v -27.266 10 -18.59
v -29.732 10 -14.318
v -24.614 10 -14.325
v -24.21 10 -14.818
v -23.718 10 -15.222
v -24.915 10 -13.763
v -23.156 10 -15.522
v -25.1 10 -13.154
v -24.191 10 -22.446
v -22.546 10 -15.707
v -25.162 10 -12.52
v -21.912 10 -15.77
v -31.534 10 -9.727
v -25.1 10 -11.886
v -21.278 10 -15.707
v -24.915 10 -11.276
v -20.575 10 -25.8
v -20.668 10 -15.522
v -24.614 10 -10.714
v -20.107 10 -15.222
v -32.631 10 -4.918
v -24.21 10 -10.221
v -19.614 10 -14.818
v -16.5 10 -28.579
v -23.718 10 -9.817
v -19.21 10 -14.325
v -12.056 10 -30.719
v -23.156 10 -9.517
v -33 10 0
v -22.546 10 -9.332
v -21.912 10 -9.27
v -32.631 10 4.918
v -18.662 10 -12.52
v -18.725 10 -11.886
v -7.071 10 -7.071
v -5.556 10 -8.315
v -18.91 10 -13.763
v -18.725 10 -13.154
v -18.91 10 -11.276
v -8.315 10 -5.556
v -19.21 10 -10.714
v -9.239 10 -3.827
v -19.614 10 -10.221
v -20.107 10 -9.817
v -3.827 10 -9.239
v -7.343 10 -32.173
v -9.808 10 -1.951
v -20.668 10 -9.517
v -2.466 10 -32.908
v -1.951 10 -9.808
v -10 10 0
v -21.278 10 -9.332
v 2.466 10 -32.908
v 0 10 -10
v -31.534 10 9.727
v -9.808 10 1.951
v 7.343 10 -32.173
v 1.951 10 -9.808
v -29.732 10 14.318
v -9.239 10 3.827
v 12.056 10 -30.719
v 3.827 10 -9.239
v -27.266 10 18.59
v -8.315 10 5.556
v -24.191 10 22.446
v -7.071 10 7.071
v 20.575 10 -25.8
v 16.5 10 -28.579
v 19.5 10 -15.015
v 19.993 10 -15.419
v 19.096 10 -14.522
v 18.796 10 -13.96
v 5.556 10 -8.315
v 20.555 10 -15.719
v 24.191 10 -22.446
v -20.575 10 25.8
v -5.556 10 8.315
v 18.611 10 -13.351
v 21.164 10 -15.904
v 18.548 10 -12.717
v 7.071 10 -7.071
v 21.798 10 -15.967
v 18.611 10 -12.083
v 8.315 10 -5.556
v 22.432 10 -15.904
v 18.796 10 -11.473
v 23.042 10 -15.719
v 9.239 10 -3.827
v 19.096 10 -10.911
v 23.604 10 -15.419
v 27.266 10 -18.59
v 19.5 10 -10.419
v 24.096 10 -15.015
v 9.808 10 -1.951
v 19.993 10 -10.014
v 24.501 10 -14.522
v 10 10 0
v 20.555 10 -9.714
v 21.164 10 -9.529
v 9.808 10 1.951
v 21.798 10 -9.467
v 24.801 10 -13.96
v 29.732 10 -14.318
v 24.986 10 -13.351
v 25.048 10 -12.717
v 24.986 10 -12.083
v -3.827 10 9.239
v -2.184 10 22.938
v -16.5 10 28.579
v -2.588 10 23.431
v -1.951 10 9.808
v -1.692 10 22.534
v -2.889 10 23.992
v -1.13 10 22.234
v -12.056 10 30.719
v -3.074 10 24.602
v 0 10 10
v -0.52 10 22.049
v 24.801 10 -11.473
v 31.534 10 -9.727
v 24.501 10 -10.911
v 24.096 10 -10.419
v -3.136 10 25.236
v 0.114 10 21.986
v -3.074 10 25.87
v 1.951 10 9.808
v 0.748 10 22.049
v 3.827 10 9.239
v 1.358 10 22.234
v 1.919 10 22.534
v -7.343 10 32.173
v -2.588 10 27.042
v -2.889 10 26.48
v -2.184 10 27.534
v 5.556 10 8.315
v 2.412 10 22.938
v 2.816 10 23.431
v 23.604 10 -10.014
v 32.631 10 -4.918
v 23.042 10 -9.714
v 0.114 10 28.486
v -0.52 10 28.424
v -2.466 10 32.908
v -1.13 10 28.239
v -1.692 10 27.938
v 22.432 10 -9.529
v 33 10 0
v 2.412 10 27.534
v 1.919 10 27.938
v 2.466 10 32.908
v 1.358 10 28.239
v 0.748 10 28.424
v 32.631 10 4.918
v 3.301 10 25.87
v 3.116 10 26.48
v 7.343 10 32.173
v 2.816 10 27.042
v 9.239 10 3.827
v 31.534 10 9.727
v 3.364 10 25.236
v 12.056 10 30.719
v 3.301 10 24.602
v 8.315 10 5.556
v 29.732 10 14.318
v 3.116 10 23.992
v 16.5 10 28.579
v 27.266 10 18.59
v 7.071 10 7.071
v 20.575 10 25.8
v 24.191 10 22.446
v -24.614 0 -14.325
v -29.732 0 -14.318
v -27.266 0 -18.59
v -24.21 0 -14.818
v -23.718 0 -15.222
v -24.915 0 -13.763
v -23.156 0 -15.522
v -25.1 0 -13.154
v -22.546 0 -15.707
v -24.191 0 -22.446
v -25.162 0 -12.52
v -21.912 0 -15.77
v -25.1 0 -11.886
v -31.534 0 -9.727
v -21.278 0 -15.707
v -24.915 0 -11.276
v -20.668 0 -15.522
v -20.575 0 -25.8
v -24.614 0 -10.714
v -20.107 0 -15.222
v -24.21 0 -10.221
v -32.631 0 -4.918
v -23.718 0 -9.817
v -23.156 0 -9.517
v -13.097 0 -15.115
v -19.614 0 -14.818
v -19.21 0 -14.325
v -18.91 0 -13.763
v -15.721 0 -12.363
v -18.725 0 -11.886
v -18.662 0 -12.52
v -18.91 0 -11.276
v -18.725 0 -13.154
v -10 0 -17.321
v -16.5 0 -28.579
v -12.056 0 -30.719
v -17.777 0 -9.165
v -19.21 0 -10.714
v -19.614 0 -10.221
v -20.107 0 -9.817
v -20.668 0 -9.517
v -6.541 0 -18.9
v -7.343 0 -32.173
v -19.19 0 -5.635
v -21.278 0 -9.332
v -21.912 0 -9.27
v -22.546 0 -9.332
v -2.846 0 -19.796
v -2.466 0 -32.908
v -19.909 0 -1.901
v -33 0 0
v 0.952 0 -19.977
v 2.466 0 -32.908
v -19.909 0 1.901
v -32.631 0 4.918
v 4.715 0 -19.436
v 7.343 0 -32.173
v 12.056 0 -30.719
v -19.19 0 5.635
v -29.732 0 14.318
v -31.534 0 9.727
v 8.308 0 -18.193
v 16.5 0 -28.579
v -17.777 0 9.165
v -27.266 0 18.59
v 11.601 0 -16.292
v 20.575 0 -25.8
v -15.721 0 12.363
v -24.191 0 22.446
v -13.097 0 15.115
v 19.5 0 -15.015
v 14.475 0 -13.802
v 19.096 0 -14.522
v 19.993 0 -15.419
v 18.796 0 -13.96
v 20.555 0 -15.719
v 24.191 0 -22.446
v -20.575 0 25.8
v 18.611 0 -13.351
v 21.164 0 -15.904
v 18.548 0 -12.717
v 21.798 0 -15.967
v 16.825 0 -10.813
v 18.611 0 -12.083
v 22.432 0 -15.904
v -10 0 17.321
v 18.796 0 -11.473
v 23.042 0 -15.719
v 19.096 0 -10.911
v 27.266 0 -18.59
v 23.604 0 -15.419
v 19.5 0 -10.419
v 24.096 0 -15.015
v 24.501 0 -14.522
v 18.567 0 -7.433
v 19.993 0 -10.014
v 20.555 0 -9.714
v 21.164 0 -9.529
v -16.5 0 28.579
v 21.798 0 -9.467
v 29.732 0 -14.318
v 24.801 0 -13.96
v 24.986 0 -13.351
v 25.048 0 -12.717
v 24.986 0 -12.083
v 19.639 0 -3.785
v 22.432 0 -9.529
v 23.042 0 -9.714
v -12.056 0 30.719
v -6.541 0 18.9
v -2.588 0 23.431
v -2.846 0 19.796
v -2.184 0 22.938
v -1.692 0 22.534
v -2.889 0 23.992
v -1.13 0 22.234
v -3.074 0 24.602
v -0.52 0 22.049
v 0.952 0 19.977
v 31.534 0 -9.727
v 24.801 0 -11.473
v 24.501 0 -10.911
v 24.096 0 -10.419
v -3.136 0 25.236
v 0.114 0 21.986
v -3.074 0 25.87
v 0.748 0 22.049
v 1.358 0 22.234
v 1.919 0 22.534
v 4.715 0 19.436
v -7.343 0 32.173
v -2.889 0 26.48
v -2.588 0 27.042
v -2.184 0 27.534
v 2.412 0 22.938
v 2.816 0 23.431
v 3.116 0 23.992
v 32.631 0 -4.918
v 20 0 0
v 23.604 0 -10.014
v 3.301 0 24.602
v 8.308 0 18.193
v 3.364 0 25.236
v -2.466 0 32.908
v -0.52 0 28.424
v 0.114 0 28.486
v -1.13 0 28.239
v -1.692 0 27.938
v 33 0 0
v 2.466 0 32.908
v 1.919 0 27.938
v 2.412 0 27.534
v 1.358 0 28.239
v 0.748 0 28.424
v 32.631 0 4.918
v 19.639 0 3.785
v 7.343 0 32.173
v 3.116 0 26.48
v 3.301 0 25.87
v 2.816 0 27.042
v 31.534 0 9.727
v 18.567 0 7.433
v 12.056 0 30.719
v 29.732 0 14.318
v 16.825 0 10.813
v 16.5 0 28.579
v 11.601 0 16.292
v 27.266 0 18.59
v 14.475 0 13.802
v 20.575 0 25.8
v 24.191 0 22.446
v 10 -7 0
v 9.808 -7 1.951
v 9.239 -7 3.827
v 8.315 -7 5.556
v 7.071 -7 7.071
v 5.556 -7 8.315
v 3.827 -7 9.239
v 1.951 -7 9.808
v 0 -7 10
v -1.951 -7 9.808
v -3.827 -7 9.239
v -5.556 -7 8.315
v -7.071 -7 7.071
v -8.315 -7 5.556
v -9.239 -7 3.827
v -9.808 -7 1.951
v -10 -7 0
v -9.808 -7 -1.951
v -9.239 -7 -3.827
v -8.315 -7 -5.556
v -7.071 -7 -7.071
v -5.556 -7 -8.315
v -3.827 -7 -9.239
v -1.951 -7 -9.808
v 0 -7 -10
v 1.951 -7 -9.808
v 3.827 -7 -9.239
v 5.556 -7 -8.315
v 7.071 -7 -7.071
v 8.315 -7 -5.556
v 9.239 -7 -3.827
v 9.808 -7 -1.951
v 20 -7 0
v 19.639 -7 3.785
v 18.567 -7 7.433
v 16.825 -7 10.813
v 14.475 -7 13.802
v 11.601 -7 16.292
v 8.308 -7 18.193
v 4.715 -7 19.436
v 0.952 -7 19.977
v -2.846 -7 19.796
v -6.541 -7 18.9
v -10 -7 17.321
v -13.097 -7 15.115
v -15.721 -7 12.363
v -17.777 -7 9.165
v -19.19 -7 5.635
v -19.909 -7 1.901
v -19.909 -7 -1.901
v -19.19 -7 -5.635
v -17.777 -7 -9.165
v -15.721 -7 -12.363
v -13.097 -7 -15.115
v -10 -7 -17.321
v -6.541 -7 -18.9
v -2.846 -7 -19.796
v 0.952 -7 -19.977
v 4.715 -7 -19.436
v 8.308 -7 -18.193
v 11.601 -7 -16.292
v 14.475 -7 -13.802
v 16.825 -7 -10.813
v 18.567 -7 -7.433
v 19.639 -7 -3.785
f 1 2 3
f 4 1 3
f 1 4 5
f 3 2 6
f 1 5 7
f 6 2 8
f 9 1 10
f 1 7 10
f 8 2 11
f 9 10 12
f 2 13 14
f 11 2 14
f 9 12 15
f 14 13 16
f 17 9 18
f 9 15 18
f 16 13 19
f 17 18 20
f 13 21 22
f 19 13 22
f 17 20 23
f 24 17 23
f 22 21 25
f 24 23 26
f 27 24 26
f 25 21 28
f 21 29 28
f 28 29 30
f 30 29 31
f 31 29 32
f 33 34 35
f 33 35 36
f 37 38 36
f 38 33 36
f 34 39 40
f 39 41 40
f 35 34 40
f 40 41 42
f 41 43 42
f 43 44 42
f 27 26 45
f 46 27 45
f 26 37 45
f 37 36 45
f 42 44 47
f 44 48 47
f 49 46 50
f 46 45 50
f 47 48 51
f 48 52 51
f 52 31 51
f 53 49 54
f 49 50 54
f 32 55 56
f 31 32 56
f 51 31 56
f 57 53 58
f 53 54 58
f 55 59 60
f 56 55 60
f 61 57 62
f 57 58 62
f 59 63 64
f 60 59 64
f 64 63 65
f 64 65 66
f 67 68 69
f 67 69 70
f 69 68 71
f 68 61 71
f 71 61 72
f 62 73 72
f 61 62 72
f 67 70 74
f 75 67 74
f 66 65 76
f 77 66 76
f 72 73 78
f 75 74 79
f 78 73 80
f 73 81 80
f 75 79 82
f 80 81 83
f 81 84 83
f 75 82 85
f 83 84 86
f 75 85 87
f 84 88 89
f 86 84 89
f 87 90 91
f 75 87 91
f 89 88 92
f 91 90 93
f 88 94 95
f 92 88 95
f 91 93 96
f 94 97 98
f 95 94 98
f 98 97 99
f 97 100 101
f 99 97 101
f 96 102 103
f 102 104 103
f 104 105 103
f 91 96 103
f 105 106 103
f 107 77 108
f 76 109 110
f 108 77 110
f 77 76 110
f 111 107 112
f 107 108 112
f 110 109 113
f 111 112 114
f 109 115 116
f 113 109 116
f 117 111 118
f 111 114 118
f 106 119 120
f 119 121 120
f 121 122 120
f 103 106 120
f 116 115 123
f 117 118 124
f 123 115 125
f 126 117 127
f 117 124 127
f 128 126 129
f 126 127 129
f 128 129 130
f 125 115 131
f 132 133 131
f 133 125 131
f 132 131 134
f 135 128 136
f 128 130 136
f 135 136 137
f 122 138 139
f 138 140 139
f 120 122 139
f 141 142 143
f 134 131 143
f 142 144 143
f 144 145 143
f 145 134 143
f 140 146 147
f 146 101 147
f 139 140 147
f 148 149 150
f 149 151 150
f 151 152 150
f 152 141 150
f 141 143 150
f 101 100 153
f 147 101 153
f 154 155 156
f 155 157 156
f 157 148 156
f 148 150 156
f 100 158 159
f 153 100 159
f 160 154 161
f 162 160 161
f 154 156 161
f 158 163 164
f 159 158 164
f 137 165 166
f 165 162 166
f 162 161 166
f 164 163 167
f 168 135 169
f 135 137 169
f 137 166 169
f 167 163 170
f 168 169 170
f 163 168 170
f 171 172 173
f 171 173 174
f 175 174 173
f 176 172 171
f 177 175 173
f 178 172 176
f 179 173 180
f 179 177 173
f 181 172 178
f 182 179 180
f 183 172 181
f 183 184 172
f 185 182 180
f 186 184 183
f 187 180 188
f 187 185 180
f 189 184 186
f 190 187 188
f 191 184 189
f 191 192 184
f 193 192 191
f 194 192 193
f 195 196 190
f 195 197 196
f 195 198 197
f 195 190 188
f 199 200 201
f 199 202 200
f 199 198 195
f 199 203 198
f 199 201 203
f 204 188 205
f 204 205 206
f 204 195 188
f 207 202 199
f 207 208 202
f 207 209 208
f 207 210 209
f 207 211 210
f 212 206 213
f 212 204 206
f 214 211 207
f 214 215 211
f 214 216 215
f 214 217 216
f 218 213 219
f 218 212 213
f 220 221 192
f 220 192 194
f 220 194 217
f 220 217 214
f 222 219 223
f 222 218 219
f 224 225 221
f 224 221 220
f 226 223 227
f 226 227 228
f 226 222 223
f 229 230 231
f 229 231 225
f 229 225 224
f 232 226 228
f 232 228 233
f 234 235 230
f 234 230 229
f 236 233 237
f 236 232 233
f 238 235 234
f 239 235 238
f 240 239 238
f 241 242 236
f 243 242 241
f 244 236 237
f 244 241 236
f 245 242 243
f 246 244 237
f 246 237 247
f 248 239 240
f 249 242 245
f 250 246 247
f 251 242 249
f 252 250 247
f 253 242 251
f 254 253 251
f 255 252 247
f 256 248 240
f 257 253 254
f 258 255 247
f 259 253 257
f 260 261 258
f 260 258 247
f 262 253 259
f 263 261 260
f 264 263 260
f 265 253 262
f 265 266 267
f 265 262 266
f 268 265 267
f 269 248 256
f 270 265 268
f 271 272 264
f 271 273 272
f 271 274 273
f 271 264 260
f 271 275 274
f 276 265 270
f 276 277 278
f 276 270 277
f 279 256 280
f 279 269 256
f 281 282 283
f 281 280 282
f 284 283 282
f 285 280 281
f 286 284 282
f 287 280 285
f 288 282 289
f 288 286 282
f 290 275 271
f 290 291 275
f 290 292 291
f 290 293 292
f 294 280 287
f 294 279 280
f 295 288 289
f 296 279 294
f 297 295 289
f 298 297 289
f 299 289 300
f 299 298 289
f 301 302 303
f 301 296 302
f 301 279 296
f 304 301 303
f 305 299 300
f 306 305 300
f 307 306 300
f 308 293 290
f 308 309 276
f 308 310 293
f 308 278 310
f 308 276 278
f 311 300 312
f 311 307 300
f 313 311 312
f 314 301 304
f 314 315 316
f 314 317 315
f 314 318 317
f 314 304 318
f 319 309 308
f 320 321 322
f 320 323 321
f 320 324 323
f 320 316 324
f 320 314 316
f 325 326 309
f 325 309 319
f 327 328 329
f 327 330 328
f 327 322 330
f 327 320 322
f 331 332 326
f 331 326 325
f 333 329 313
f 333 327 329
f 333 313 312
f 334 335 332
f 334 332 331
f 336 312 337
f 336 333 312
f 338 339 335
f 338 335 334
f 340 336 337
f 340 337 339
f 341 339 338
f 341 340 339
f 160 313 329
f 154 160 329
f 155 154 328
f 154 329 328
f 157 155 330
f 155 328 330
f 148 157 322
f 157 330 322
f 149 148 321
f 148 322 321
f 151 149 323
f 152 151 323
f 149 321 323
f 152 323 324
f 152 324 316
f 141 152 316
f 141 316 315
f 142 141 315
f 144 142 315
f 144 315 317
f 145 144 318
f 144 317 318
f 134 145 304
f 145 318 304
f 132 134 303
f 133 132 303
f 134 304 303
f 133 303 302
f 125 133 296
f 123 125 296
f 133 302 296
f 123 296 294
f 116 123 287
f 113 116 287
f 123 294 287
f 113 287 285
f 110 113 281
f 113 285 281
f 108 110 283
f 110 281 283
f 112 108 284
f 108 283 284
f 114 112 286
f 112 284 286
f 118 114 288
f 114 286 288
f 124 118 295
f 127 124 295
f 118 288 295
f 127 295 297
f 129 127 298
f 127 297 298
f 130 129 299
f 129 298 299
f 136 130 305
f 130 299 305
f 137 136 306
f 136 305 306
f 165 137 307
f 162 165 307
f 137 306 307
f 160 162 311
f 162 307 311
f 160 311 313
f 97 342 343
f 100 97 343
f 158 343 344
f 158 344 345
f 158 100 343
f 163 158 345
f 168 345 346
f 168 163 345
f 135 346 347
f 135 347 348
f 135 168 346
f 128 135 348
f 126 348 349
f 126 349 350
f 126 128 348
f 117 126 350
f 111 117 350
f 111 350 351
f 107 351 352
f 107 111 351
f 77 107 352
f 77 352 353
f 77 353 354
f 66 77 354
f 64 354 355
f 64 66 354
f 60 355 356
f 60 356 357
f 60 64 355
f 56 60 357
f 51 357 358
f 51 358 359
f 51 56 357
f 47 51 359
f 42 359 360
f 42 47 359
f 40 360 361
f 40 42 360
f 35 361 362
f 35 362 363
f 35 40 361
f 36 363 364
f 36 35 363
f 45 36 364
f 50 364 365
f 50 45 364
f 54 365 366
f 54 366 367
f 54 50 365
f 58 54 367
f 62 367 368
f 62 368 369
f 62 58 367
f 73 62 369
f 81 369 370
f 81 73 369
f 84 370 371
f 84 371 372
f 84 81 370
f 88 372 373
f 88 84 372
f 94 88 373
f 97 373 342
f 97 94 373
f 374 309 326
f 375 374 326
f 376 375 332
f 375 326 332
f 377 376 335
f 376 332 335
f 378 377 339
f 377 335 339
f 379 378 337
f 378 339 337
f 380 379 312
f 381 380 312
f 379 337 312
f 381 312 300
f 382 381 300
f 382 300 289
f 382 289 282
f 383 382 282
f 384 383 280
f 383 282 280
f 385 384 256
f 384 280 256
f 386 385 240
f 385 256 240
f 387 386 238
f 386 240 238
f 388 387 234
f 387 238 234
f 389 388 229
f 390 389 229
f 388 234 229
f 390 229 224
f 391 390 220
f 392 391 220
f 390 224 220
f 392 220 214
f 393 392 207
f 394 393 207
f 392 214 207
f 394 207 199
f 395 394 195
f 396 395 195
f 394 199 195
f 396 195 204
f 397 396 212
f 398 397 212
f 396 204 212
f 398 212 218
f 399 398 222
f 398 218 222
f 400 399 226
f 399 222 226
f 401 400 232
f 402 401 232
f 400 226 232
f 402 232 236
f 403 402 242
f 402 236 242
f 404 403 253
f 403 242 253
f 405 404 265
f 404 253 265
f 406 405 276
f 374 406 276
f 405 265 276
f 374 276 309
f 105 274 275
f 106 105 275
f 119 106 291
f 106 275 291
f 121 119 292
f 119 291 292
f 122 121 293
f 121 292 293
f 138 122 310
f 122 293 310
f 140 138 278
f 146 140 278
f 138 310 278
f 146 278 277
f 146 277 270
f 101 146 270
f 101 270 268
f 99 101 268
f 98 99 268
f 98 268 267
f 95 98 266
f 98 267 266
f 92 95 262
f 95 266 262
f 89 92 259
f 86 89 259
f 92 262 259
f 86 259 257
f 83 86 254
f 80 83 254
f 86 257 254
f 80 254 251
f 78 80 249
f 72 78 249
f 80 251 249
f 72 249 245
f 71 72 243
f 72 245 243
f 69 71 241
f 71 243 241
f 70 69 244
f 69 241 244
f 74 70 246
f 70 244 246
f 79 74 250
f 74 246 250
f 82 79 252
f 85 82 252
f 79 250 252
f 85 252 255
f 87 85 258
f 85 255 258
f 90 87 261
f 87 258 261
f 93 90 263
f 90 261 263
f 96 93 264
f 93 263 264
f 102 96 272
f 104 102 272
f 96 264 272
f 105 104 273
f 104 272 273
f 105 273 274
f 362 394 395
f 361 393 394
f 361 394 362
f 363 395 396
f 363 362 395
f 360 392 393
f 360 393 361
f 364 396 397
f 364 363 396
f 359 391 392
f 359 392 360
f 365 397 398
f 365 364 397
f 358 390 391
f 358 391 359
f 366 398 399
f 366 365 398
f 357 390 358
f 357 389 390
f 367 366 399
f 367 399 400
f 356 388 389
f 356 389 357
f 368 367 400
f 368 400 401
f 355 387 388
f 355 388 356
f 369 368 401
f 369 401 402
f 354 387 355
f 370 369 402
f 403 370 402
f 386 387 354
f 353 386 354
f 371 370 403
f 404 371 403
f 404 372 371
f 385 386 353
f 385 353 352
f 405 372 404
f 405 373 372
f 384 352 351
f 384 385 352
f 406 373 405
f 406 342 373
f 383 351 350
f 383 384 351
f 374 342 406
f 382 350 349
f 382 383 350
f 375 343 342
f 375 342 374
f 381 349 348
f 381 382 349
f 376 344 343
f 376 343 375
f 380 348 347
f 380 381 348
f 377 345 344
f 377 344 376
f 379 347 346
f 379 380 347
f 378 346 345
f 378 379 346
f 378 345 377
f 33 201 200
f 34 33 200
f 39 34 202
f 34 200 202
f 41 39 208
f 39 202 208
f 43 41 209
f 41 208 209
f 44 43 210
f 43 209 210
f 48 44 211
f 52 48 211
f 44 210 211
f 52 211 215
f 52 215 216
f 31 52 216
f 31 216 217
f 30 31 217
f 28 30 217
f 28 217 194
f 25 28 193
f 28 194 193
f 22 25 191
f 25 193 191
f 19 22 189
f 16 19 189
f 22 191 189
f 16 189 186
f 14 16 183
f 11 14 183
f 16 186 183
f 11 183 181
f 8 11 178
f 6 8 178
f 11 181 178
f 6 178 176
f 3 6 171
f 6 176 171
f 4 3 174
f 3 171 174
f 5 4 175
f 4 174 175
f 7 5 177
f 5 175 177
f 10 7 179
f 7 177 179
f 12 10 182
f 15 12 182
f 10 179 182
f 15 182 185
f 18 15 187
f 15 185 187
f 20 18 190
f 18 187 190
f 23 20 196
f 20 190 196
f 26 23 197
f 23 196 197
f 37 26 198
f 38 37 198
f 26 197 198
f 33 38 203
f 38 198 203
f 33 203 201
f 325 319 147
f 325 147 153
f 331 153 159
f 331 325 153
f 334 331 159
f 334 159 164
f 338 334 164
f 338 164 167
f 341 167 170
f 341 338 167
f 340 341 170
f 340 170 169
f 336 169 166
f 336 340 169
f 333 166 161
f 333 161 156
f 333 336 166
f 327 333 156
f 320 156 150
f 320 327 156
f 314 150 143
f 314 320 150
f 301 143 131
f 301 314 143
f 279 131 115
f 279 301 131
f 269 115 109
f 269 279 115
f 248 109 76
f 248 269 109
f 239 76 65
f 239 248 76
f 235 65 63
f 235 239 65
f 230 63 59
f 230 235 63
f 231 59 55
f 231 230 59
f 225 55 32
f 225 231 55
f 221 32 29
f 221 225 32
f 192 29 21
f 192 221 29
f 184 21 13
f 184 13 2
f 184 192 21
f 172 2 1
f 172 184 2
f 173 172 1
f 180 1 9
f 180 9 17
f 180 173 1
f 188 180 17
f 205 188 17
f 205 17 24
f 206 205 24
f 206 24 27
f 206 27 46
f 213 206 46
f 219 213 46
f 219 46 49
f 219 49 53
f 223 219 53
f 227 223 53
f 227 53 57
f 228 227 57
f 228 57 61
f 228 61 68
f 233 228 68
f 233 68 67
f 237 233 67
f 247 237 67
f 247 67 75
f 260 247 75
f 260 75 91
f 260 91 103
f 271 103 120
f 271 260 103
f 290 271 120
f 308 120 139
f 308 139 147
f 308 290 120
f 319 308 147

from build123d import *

# Parameters (mm, degrees)
F0_R     = 33
F0_R_2   = 3.25
F0_R_3   = 20
F0_R_4   = 10
F1_DEPTH = 10
F2_DEPTH = 7


with BuildPart() as f1:
    # F0 (on Front) → F1 (new body)
    with BuildSketch(Plane.XZ):
        Circle(F0_R)
        with Locations((-21.9121137141, -12.5195478067)):
            Circle(F0_R_2, mode=Mode.SUBTRACT)
        with Locations((21.7983033015, -12.7166732237)):
            Circle(F0_R_2, mode=Mode.SUBTRACT)
        Circle(F0_R_3, mode=Mode.SUBTRACT)
        with Locations((0.1138104126, 25.2362210304)):
            Circle(F0_R_2, mode=Mode.SUBTRACT)
        Circle(F0_R_3)
        Circle(F0_R_4, mode=Mode.SUBTRACT)
    extrude(amount=-F1_DEPTH)

    # F0 (on Front) → F2 (join)
    with BuildSketch(Plane.XZ):
        Circle(F0_R_3)
        Circle(F0_R_4, mode=Mode.SUBTRACT)
    extrude(amount=F2_DEPTH)


solid = f1.part
